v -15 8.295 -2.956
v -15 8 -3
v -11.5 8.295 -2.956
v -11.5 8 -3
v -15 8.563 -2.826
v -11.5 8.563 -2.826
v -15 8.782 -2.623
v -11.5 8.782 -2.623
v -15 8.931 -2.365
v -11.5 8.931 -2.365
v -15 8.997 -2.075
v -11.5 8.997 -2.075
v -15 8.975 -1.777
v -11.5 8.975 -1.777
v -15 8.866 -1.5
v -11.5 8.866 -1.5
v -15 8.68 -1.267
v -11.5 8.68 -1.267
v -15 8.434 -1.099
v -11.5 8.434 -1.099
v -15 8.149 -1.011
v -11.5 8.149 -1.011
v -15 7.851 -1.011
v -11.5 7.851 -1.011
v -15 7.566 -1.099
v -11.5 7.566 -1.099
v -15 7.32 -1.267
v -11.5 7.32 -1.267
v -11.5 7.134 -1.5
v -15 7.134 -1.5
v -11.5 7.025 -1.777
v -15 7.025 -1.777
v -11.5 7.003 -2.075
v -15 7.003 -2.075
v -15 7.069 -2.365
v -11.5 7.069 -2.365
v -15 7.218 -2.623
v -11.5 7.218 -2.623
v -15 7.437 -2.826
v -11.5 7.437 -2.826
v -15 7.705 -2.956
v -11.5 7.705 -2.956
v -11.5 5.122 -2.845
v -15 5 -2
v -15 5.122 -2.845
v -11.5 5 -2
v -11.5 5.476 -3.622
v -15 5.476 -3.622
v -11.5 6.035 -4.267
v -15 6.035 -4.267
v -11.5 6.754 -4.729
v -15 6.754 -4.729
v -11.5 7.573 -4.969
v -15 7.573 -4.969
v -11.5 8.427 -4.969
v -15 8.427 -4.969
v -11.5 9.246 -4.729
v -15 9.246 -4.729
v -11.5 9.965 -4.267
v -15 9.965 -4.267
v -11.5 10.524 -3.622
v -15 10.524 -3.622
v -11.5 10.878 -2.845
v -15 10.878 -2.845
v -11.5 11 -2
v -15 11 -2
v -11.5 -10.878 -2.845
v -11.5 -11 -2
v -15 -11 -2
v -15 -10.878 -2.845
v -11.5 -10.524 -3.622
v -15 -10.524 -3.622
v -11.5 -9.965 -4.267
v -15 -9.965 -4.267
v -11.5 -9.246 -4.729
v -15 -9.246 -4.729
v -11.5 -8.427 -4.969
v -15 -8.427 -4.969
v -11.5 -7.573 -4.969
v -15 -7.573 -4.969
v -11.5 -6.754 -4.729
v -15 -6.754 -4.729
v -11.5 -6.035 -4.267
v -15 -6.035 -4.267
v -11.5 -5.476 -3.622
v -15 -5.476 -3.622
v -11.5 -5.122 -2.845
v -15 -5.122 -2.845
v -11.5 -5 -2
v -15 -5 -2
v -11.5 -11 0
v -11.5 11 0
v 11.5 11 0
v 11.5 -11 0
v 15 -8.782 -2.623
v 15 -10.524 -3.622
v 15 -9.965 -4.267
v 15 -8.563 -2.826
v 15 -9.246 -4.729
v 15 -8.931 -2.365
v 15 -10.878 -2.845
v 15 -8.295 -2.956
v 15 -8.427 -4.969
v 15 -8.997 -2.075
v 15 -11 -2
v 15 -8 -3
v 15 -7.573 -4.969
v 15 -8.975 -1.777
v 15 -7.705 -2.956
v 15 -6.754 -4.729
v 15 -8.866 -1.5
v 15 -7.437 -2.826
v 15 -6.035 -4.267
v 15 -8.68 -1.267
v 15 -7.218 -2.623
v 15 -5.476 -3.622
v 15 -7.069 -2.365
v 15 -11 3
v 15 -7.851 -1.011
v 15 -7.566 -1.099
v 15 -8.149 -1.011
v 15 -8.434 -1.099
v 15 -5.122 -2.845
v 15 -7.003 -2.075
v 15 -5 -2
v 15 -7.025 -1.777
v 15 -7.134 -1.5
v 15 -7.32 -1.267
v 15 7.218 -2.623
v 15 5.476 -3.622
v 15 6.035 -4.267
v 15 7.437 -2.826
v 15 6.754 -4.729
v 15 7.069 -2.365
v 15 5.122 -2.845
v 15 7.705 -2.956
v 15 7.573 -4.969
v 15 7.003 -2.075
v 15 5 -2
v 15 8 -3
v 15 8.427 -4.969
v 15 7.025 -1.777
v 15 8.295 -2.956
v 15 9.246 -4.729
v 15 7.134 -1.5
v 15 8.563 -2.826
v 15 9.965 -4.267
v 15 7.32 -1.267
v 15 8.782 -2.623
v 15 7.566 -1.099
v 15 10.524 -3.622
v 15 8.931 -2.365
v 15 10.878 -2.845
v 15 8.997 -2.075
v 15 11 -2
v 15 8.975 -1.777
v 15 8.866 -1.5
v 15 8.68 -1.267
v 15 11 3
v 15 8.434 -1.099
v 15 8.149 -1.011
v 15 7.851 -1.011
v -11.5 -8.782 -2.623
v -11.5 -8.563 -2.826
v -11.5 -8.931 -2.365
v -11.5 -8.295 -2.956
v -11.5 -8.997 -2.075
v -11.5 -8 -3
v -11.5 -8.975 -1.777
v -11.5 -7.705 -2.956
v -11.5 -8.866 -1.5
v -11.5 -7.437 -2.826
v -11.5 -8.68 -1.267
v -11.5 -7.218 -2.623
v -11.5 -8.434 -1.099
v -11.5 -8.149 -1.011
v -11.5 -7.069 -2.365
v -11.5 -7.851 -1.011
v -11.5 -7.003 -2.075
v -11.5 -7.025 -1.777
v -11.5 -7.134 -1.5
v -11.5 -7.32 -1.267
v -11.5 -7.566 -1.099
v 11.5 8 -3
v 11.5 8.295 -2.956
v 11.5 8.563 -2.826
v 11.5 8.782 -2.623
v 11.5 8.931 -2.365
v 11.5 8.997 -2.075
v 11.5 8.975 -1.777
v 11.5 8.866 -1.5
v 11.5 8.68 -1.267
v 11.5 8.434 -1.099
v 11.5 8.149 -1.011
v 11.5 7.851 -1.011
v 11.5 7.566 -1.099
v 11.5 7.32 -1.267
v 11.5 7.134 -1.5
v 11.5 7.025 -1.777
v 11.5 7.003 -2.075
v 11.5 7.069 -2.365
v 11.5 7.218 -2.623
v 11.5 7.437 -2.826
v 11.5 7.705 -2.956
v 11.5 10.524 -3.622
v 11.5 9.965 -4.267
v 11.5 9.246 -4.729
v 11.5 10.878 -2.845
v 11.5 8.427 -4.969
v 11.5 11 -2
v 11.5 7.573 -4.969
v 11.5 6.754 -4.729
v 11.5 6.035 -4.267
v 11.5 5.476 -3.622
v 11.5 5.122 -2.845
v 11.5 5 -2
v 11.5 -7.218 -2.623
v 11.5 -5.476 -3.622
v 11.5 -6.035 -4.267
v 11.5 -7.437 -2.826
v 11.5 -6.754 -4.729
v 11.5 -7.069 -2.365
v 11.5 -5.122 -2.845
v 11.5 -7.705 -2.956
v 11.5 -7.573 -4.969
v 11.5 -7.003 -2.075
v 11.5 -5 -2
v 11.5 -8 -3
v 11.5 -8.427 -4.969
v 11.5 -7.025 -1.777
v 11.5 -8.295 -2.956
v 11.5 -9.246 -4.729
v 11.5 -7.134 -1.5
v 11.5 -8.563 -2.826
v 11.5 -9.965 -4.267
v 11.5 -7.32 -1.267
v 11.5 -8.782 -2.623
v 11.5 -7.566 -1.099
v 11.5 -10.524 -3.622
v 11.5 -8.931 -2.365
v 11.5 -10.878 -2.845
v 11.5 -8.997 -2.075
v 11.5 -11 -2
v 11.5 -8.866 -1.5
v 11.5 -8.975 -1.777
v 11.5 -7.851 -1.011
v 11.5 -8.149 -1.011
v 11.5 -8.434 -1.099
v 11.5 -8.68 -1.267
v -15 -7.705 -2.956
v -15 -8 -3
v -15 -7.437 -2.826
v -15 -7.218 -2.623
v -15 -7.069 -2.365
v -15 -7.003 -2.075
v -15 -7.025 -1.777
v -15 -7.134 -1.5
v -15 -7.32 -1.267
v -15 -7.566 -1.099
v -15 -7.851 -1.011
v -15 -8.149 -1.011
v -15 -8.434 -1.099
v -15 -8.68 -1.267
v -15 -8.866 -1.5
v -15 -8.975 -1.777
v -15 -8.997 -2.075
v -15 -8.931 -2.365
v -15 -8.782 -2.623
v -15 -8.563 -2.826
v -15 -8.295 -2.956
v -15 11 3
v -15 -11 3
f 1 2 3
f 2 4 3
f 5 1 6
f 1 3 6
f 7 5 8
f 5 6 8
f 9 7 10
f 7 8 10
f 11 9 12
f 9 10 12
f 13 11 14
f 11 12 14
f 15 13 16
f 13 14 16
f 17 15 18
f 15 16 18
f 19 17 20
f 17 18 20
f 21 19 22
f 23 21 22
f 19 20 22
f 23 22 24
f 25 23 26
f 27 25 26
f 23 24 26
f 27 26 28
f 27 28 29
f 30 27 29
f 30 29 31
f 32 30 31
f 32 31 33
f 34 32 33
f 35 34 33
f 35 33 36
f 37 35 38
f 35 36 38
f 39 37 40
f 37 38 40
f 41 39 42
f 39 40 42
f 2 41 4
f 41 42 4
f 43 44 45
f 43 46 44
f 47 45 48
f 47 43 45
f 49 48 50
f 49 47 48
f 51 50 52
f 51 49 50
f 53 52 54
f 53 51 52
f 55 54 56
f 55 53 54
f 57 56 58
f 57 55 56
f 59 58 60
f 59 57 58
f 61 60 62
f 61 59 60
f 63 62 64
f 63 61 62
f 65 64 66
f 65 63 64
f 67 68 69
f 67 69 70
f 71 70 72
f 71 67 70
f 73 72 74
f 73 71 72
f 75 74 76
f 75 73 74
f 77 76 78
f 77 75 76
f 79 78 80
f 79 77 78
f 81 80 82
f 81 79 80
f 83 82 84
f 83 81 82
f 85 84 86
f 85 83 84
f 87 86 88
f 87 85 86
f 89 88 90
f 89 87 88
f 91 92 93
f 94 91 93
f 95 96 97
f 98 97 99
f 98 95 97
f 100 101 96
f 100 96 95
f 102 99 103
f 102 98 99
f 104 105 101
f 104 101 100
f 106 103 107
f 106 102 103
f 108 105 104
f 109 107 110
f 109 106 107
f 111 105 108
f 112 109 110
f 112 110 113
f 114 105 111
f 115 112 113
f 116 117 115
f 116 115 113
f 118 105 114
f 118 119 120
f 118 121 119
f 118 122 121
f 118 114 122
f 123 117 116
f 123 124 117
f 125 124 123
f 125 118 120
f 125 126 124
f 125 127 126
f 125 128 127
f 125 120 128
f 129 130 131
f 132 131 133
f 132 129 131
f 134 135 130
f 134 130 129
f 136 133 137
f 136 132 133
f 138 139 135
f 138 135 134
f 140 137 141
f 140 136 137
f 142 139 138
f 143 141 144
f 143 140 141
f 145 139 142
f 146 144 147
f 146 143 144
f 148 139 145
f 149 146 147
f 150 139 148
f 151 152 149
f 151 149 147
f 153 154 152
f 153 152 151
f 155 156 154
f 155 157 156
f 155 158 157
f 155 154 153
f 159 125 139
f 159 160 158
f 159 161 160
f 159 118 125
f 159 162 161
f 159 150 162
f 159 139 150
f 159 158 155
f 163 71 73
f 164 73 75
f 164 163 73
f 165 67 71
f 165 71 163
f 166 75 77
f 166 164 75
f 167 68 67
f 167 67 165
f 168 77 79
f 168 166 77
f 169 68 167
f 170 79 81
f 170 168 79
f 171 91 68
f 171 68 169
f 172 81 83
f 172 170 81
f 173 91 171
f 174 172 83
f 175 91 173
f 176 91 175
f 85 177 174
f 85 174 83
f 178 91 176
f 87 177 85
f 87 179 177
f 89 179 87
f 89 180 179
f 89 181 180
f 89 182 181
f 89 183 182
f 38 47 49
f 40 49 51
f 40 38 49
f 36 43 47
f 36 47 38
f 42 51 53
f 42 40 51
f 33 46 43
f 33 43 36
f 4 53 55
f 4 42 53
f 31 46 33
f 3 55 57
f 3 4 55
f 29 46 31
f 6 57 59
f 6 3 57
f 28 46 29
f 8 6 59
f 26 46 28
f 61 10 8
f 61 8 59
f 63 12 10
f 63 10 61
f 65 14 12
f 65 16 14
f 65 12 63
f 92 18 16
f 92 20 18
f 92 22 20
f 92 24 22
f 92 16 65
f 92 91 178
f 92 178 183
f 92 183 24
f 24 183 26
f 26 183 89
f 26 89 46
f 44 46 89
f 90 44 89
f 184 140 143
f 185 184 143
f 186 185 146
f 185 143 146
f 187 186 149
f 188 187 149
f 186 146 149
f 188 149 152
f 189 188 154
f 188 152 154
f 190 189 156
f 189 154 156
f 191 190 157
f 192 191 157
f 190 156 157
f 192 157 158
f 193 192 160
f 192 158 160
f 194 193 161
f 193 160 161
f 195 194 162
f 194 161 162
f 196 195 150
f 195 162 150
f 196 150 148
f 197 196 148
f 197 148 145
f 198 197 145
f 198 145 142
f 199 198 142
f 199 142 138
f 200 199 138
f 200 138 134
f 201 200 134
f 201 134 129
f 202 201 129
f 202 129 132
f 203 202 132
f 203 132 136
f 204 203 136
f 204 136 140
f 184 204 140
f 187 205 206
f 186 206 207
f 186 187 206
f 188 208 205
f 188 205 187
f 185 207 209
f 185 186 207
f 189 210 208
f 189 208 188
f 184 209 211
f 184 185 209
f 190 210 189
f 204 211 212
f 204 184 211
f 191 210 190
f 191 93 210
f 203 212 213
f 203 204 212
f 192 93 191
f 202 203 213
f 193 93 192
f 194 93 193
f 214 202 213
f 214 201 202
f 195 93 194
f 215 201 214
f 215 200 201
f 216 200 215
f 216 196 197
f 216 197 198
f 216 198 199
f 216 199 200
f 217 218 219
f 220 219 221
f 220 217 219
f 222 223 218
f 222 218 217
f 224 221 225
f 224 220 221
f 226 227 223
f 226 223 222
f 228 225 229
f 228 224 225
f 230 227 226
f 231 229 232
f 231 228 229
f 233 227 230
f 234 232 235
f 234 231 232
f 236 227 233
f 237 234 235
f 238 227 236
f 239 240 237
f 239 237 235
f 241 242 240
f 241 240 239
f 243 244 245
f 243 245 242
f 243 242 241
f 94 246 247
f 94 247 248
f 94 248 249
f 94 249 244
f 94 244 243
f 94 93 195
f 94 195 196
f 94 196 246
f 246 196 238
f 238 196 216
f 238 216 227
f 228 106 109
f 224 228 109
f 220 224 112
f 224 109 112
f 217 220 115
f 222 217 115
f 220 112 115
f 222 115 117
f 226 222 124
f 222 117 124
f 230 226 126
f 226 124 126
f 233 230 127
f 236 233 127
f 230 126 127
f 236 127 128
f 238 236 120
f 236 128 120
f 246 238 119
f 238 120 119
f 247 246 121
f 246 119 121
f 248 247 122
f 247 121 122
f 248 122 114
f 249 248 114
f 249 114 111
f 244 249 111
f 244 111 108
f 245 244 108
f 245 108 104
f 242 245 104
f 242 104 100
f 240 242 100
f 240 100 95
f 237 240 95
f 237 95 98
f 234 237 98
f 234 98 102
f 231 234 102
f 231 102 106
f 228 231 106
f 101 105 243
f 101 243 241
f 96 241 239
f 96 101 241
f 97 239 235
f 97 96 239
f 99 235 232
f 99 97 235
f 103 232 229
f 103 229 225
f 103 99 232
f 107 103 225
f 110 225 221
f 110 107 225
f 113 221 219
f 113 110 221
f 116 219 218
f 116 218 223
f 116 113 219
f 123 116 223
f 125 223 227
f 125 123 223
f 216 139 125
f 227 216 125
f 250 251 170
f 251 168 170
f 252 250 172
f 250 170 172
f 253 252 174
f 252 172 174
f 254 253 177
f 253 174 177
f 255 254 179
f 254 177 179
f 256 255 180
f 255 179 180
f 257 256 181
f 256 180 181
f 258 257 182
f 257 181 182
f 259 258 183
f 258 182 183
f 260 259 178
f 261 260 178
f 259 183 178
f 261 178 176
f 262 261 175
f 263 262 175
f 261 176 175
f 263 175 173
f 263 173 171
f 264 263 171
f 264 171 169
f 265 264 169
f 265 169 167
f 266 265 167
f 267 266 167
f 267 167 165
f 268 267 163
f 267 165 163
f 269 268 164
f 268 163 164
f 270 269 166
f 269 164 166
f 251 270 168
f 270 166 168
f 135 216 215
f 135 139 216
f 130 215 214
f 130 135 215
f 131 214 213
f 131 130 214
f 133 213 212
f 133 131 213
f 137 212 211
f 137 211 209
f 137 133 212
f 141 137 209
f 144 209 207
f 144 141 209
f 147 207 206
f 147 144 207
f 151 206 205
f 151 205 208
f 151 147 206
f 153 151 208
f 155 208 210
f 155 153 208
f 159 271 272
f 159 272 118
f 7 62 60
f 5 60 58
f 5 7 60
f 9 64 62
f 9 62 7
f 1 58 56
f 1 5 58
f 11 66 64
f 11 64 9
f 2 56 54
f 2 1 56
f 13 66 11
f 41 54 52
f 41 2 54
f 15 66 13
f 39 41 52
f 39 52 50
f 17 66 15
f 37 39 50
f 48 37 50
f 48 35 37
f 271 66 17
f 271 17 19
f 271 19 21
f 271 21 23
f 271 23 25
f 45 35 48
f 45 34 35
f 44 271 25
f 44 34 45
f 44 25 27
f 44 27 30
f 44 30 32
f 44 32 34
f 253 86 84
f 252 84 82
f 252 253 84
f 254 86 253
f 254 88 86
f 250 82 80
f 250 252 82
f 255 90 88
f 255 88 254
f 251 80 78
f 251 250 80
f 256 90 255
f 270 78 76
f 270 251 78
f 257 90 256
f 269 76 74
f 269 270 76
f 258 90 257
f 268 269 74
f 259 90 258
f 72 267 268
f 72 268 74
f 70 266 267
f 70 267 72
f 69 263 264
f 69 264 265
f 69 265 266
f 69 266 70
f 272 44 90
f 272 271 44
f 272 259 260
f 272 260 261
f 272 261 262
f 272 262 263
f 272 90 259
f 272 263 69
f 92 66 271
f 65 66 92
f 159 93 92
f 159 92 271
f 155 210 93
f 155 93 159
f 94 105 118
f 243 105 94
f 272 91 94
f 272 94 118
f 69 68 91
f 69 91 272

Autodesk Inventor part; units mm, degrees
ref_plane "YZ Plane" through (0, 0, 0) normal (1, 0, 0) x (0, 1, 0)
ref_plane "XZ Plane" through (0, 0, 0) normal (0, 1, 0) x (-1, 0, 0)
ref_plane "XY Plane" through (0, 0, 0) normal (0, 0, 1) x (1, 0, 0)
sketch "Sketch1" plane through (0, 0, 0) normal (0, 0, 1) x (1, 0, 0)
  line L0 (-11.5, 11) -> (11.5, 11)
  line L1 (11.5, 11) -> (11.5, -11)
  line L2 (11.5, -11) -> (-11.5, -11)
  line L3 (-11.5, -11) -> (-11.5, 11)
  line L4 (-11.5, 11) -> (11.5, -11) construction
  line L5 (11.5, 11) -> (-11.5, -11) construction
  point P0 (0, 0)
  dimension "d0" = 23
  dimension "d1" = 22
extrude "Extrusion1" add sketch "Sketch1" along normal blind 3
sketch "Sketch2" plane through (0, 0, 3) normal (0, 0, 1) x (1, 0, 0)
  line L0 (11.5, 11) -> (-11.5, 11) projected
  line L1 (-11.5, 11) -> (-15, 11)
  line L2 (-15, 11) -> (-15, -11)
  line L3 (-15, -11) -> (-11.5, -11)
  line L4 (-11.5, -11) -> (-11.5, 11)
  line L5 (-11.5, -11) -> (11.5, -11) projected
  line L6 (11.5, -11) -> (15, -11)
  line L7 (15, -11) -> (15, 11)
  line L8 (15, 11) -> (11.5, 11)
  line L9 (11.5, 11) -> (11.5, -11)
  point P0 (0, 0)
  dimension "d4" = 3.5
  dimension "d5" = 3.5
extrude "Extrusion2" add sketch "Sketch2" against normal blind 8.5 contours L8 L7 L6 L9 | L4 L3 L2 L1
sketch "Sketch3" plane through (15, -11, 3) normal (1, 0, 0) x (0, 0, -1)
  line L0 (0, 0) -> (0, 22) construction
  line L1 (0, 22) -> (8.5, 22) construction
  line L2 (8.5, 22) -> (8.5, 0) construction
  line L3 (8.5, 0) -> (0, 0) construction
  circle A0 centre (5, 19) radius 1
  circle A1 centre (5, 3) radius 1
  line L4 (3, 22) -> (3, 0) construction
  arc A2 (5, 16) -> (5, 22) centre (5, 19) ccw
  line L5 (5, 22) -> (5, 0) construction
  arc A3 (5, 0) -> (5, 6) centre (5, 3) ccw
  line L6 (5, 16) -> (5, 6)
  line L7 (3, 22) -> (8.5, 22) projected
  line L8 (5, 0) -> (8.5, 0)
  line L9 (8.5, 0) -> (8.5, 22)
  line L10 (8.5, 22) -> (5, 22)
  point P0 (3, 11)
  point P1 (3, 11)
  dimension "d8" = 2
  dimension "d9" = 2
  dimension "d10" = 16
  dimension "d11" = 2
  dimension "d12" = 8
extrude "Extrusion3" cut sketch "Sketch3" against normal through all
sketch "Sketch4" plane through (15, -11, 3) normal (1, 0, 0) x (0, 0, -1)
  line L0 (0, 0) -> (0, 22) projected
  line L1 (0, 21.5) -> (5, 21.5)
  line L2 (5, 21.5) -> (5, 23.5)
  line L3 (5, 23.5) -> (0, 23.5)
  line L4 (0, 23.5) -> (0, 21.5)
  line L5 (0, 22) -> (5, 22) projected
  line L6 (0, 0.5) -> (5, 0.5)
  line L7 (5, 0.5) -> (5, -1.5)
  line L8 (5, -1.5) -> (0, -1.5)
  line L9 (0, -1.5) -> (0, 0.5)
  line L10 (0, 0) -> (5, 0) projected
  dimension "d21" = 5
  dimension "d22" = 2
  dimension "d23" = 0.5
  dimension "d24" = 5
  dimension "d25" = 2
  dimension "d26" = 0.5
extrude "Extrusion4" [suppressed]
equation "\"d12\" = 0.5 * d10"
properties part number "Motor_Base"
